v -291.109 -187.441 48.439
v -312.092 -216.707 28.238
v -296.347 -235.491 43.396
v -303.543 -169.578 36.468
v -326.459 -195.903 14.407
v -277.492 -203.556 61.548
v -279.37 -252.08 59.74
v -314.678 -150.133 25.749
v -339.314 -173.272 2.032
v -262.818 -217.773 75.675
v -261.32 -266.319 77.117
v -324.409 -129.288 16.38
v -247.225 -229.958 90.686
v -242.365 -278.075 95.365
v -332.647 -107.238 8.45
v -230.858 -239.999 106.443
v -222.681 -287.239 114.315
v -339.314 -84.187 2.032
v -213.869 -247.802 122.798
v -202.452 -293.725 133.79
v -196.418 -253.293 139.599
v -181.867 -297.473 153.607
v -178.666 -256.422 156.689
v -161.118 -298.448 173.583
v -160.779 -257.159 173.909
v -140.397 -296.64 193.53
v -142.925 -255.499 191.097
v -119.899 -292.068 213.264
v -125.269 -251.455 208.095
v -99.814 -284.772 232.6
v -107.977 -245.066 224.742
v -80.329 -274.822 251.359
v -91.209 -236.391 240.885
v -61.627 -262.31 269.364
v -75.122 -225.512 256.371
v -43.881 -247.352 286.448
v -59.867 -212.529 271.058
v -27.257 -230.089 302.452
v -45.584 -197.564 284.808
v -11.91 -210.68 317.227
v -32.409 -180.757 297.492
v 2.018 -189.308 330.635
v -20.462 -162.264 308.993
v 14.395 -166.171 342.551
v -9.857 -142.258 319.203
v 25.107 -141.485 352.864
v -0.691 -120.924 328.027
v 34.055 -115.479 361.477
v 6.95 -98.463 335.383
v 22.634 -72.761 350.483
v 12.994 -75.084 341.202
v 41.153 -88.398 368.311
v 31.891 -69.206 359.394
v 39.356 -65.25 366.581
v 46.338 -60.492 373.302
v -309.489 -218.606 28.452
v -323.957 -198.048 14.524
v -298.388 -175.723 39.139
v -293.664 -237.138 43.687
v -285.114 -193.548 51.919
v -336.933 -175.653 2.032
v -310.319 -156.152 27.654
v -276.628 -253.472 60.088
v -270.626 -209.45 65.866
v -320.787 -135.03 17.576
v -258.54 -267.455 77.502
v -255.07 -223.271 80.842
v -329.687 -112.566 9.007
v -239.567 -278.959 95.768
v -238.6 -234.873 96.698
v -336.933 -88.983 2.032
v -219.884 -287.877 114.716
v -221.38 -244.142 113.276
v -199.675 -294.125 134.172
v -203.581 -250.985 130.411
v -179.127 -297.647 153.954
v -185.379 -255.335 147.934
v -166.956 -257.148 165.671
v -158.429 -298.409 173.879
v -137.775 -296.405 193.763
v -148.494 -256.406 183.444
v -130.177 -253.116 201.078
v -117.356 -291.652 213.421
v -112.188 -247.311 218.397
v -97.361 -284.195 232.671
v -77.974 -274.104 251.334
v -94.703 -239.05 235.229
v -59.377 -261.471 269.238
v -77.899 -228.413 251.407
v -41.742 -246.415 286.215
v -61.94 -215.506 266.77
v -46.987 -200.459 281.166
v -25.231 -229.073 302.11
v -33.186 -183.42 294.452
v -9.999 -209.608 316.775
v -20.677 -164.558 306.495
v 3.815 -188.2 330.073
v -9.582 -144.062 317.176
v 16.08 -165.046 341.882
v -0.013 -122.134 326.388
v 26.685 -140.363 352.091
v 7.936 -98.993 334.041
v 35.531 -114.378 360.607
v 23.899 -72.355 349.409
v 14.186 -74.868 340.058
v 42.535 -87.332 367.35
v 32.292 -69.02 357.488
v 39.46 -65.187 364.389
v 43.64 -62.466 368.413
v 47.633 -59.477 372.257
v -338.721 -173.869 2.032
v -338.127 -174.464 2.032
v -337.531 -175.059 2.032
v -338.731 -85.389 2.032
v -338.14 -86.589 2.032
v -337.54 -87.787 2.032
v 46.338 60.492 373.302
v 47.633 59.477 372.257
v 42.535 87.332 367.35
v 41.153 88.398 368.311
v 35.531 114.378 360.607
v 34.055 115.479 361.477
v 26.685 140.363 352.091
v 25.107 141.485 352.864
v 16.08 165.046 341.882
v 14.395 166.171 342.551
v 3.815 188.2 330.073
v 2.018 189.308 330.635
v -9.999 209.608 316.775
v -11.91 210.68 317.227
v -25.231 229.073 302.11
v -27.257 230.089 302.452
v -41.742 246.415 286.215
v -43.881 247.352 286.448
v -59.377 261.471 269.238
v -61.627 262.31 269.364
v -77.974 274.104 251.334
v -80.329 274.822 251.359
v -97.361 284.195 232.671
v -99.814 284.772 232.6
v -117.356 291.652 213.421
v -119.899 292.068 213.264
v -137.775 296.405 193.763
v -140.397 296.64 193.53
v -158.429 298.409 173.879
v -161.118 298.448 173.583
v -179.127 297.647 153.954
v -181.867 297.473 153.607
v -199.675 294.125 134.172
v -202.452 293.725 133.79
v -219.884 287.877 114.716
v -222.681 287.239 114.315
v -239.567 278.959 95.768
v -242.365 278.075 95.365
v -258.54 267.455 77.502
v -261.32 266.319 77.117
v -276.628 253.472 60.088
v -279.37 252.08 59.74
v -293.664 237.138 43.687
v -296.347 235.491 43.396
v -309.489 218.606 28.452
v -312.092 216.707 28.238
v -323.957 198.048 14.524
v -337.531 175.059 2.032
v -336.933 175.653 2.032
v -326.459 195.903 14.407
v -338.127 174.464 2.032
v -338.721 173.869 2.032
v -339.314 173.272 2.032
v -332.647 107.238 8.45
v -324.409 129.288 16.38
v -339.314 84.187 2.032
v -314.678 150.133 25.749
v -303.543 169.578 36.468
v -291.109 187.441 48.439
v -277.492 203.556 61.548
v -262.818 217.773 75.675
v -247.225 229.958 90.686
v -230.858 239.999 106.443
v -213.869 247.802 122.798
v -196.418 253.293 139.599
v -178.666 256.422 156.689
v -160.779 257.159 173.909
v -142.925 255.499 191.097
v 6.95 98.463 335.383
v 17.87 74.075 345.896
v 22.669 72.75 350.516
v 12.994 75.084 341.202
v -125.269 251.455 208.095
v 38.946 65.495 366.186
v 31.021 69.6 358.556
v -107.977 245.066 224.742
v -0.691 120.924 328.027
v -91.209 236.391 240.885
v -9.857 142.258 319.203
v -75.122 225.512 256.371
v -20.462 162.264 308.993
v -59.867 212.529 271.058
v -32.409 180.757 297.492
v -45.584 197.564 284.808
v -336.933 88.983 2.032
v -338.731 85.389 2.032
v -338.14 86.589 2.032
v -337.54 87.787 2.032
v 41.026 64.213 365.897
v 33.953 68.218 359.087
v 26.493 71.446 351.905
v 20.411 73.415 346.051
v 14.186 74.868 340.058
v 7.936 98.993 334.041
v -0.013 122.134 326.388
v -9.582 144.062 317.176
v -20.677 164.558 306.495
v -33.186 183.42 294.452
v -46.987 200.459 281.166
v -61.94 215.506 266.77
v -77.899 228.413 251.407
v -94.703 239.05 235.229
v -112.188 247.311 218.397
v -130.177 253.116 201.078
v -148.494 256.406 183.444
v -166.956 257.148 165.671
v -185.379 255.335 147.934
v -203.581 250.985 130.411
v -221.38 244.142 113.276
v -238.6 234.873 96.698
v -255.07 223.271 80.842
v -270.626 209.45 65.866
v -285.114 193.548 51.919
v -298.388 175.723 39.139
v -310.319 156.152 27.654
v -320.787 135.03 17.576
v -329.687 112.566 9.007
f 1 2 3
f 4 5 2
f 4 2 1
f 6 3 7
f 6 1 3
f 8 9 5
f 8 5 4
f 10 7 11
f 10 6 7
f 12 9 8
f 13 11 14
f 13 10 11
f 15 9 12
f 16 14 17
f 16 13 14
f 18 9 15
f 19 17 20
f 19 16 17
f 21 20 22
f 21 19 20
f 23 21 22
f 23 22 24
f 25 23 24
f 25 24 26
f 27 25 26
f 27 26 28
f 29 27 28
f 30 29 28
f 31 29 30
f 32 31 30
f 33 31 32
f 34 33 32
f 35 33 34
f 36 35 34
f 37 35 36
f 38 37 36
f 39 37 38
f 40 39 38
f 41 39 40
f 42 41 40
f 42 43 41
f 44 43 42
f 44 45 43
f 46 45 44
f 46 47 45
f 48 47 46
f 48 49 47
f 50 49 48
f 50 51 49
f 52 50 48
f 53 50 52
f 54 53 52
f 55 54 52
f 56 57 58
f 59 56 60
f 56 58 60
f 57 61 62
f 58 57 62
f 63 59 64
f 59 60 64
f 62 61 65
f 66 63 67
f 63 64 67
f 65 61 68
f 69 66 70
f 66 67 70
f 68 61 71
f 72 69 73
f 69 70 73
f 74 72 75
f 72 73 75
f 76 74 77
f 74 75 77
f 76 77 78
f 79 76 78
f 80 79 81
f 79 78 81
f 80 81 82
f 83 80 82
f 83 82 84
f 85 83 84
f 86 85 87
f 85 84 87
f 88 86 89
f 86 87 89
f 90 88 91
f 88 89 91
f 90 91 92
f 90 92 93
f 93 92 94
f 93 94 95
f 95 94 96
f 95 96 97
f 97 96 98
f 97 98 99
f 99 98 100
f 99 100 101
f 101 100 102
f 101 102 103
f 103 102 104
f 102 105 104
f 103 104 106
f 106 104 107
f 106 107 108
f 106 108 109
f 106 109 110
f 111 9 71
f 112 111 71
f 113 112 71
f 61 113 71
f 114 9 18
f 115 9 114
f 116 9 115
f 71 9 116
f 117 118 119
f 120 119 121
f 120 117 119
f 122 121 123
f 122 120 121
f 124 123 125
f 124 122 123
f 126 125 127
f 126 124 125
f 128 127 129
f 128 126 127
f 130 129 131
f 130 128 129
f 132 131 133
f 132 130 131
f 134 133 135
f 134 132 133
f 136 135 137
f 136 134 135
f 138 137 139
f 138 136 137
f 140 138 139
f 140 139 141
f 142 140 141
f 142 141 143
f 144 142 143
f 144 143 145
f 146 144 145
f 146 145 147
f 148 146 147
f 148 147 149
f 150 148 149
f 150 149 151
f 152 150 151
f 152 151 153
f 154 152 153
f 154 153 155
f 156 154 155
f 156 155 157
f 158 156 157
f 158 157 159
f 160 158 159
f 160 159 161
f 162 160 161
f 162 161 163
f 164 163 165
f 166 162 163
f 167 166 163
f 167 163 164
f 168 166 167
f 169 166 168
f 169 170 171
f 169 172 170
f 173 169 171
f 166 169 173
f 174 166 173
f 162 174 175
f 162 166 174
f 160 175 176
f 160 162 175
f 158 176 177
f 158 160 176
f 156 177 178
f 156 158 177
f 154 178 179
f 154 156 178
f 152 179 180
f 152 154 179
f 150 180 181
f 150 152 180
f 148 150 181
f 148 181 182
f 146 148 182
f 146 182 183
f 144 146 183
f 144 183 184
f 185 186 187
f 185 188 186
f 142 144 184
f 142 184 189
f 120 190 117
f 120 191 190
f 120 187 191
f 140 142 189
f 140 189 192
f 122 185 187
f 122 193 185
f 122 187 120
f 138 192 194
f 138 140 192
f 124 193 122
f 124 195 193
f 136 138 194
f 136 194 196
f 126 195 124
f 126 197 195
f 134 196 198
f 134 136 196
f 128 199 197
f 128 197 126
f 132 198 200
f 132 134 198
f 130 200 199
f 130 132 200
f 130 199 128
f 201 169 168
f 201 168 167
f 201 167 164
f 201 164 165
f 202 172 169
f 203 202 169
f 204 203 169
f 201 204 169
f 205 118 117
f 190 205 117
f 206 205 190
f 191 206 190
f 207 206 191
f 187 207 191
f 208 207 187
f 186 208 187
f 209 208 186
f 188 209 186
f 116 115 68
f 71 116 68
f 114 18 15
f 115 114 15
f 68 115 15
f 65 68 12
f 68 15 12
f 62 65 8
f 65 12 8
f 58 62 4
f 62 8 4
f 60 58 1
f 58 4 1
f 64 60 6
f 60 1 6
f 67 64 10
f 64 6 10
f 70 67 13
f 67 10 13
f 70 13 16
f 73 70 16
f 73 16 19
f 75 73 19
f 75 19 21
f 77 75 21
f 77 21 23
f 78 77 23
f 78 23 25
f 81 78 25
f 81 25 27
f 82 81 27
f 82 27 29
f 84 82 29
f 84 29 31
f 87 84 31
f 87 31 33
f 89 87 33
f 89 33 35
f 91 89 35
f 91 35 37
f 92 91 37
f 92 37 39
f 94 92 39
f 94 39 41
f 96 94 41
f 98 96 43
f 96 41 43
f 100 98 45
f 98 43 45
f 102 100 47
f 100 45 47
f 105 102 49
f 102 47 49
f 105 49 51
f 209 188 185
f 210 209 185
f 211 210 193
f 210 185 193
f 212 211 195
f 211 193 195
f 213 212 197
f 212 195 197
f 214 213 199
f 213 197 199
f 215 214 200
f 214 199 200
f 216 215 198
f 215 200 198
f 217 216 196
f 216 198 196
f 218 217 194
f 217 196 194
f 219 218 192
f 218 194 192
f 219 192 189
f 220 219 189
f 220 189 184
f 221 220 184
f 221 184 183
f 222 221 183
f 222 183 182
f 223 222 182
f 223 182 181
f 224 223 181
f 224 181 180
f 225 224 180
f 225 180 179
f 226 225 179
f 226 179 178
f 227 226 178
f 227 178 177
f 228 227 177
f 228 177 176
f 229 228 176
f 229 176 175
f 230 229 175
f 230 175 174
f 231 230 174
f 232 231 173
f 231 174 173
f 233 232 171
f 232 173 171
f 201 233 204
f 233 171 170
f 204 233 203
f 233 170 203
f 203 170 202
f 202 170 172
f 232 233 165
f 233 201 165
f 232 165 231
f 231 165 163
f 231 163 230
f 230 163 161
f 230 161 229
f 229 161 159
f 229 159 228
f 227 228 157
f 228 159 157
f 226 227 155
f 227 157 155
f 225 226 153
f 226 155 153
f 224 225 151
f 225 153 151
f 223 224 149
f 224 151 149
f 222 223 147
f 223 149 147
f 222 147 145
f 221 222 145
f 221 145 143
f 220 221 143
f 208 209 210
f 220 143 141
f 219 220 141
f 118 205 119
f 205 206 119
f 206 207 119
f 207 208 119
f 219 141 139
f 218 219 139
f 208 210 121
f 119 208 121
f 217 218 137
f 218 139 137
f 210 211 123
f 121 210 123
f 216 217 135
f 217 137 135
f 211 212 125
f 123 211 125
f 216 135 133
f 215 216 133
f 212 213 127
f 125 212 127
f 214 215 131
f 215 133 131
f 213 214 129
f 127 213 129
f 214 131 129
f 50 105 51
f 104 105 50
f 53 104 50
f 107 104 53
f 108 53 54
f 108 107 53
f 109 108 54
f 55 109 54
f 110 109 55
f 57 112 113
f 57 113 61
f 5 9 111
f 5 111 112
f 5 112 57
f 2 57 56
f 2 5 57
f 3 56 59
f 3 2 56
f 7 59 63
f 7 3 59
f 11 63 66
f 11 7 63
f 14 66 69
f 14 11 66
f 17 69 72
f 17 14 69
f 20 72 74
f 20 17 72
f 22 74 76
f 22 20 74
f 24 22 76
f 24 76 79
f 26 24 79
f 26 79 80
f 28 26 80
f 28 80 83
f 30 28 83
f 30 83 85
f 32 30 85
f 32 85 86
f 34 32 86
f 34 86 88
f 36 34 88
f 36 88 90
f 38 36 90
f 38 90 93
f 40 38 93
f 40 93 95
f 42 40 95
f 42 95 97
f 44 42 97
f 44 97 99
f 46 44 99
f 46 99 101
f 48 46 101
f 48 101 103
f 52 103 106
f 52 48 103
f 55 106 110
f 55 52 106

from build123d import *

# Parameters (mm, degrees)
SKETCH2_R               = 298.47899177
SKETCH2_R_2             = 257.20399177
EXTRUDE1_DEPTH          = 1.651
SKETCH3_R               = 76.2
CUT_EXTRUDE1_DEPTH      = 378.598146182
SKETCH4_R               = 381
CUT_EXTRUDE2_DEPTH      = 2.032
CUT_EXTRUDE2_DEPTH_BACK = 38.60972985


with BuildPart() as part:
    # Sketch2 → Extrude1 (new body)
    with BuildSketch(Plane(origin=(-164.227634794, 0, 170.588907734), x_dir=(0.720411288, 0, 0.693547098), z_dir=(-0.693547098, 0, 0.720411288))):
        Circle(SKETCH2_R)
        Circle(SKETCH2_R_2, mode=Mode.SUBTRACT)
    extrude(amount=-EXTRUDE1_DEPTH)

    # Sketch3 → Cut-Extrude1 (cut, through all)
    with BuildSketch(Plane.XY):
        Circle(SKETCH3_R)
    extrude(amount=CUT_EXTRUDE1_DEPTH, mode=Mode.SUBTRACT)

    # Sketch4 → Cut-Extrude2 (cut, two sides)
    with BuildSketch(Plane.XY) as cut_extrude2_sk:
        Circle(SKETCH4_R)
    extrude(amount=CUT_EXTRUDE2_DEPTH, mode=Mode.SUBTRACT)
    extrude(cut_extrude2_sk.sketch, amount=-CUT_EXTRUDE2_DEPTH_BACK, mode=Mode.SUBTRACT)


solid = part.part
